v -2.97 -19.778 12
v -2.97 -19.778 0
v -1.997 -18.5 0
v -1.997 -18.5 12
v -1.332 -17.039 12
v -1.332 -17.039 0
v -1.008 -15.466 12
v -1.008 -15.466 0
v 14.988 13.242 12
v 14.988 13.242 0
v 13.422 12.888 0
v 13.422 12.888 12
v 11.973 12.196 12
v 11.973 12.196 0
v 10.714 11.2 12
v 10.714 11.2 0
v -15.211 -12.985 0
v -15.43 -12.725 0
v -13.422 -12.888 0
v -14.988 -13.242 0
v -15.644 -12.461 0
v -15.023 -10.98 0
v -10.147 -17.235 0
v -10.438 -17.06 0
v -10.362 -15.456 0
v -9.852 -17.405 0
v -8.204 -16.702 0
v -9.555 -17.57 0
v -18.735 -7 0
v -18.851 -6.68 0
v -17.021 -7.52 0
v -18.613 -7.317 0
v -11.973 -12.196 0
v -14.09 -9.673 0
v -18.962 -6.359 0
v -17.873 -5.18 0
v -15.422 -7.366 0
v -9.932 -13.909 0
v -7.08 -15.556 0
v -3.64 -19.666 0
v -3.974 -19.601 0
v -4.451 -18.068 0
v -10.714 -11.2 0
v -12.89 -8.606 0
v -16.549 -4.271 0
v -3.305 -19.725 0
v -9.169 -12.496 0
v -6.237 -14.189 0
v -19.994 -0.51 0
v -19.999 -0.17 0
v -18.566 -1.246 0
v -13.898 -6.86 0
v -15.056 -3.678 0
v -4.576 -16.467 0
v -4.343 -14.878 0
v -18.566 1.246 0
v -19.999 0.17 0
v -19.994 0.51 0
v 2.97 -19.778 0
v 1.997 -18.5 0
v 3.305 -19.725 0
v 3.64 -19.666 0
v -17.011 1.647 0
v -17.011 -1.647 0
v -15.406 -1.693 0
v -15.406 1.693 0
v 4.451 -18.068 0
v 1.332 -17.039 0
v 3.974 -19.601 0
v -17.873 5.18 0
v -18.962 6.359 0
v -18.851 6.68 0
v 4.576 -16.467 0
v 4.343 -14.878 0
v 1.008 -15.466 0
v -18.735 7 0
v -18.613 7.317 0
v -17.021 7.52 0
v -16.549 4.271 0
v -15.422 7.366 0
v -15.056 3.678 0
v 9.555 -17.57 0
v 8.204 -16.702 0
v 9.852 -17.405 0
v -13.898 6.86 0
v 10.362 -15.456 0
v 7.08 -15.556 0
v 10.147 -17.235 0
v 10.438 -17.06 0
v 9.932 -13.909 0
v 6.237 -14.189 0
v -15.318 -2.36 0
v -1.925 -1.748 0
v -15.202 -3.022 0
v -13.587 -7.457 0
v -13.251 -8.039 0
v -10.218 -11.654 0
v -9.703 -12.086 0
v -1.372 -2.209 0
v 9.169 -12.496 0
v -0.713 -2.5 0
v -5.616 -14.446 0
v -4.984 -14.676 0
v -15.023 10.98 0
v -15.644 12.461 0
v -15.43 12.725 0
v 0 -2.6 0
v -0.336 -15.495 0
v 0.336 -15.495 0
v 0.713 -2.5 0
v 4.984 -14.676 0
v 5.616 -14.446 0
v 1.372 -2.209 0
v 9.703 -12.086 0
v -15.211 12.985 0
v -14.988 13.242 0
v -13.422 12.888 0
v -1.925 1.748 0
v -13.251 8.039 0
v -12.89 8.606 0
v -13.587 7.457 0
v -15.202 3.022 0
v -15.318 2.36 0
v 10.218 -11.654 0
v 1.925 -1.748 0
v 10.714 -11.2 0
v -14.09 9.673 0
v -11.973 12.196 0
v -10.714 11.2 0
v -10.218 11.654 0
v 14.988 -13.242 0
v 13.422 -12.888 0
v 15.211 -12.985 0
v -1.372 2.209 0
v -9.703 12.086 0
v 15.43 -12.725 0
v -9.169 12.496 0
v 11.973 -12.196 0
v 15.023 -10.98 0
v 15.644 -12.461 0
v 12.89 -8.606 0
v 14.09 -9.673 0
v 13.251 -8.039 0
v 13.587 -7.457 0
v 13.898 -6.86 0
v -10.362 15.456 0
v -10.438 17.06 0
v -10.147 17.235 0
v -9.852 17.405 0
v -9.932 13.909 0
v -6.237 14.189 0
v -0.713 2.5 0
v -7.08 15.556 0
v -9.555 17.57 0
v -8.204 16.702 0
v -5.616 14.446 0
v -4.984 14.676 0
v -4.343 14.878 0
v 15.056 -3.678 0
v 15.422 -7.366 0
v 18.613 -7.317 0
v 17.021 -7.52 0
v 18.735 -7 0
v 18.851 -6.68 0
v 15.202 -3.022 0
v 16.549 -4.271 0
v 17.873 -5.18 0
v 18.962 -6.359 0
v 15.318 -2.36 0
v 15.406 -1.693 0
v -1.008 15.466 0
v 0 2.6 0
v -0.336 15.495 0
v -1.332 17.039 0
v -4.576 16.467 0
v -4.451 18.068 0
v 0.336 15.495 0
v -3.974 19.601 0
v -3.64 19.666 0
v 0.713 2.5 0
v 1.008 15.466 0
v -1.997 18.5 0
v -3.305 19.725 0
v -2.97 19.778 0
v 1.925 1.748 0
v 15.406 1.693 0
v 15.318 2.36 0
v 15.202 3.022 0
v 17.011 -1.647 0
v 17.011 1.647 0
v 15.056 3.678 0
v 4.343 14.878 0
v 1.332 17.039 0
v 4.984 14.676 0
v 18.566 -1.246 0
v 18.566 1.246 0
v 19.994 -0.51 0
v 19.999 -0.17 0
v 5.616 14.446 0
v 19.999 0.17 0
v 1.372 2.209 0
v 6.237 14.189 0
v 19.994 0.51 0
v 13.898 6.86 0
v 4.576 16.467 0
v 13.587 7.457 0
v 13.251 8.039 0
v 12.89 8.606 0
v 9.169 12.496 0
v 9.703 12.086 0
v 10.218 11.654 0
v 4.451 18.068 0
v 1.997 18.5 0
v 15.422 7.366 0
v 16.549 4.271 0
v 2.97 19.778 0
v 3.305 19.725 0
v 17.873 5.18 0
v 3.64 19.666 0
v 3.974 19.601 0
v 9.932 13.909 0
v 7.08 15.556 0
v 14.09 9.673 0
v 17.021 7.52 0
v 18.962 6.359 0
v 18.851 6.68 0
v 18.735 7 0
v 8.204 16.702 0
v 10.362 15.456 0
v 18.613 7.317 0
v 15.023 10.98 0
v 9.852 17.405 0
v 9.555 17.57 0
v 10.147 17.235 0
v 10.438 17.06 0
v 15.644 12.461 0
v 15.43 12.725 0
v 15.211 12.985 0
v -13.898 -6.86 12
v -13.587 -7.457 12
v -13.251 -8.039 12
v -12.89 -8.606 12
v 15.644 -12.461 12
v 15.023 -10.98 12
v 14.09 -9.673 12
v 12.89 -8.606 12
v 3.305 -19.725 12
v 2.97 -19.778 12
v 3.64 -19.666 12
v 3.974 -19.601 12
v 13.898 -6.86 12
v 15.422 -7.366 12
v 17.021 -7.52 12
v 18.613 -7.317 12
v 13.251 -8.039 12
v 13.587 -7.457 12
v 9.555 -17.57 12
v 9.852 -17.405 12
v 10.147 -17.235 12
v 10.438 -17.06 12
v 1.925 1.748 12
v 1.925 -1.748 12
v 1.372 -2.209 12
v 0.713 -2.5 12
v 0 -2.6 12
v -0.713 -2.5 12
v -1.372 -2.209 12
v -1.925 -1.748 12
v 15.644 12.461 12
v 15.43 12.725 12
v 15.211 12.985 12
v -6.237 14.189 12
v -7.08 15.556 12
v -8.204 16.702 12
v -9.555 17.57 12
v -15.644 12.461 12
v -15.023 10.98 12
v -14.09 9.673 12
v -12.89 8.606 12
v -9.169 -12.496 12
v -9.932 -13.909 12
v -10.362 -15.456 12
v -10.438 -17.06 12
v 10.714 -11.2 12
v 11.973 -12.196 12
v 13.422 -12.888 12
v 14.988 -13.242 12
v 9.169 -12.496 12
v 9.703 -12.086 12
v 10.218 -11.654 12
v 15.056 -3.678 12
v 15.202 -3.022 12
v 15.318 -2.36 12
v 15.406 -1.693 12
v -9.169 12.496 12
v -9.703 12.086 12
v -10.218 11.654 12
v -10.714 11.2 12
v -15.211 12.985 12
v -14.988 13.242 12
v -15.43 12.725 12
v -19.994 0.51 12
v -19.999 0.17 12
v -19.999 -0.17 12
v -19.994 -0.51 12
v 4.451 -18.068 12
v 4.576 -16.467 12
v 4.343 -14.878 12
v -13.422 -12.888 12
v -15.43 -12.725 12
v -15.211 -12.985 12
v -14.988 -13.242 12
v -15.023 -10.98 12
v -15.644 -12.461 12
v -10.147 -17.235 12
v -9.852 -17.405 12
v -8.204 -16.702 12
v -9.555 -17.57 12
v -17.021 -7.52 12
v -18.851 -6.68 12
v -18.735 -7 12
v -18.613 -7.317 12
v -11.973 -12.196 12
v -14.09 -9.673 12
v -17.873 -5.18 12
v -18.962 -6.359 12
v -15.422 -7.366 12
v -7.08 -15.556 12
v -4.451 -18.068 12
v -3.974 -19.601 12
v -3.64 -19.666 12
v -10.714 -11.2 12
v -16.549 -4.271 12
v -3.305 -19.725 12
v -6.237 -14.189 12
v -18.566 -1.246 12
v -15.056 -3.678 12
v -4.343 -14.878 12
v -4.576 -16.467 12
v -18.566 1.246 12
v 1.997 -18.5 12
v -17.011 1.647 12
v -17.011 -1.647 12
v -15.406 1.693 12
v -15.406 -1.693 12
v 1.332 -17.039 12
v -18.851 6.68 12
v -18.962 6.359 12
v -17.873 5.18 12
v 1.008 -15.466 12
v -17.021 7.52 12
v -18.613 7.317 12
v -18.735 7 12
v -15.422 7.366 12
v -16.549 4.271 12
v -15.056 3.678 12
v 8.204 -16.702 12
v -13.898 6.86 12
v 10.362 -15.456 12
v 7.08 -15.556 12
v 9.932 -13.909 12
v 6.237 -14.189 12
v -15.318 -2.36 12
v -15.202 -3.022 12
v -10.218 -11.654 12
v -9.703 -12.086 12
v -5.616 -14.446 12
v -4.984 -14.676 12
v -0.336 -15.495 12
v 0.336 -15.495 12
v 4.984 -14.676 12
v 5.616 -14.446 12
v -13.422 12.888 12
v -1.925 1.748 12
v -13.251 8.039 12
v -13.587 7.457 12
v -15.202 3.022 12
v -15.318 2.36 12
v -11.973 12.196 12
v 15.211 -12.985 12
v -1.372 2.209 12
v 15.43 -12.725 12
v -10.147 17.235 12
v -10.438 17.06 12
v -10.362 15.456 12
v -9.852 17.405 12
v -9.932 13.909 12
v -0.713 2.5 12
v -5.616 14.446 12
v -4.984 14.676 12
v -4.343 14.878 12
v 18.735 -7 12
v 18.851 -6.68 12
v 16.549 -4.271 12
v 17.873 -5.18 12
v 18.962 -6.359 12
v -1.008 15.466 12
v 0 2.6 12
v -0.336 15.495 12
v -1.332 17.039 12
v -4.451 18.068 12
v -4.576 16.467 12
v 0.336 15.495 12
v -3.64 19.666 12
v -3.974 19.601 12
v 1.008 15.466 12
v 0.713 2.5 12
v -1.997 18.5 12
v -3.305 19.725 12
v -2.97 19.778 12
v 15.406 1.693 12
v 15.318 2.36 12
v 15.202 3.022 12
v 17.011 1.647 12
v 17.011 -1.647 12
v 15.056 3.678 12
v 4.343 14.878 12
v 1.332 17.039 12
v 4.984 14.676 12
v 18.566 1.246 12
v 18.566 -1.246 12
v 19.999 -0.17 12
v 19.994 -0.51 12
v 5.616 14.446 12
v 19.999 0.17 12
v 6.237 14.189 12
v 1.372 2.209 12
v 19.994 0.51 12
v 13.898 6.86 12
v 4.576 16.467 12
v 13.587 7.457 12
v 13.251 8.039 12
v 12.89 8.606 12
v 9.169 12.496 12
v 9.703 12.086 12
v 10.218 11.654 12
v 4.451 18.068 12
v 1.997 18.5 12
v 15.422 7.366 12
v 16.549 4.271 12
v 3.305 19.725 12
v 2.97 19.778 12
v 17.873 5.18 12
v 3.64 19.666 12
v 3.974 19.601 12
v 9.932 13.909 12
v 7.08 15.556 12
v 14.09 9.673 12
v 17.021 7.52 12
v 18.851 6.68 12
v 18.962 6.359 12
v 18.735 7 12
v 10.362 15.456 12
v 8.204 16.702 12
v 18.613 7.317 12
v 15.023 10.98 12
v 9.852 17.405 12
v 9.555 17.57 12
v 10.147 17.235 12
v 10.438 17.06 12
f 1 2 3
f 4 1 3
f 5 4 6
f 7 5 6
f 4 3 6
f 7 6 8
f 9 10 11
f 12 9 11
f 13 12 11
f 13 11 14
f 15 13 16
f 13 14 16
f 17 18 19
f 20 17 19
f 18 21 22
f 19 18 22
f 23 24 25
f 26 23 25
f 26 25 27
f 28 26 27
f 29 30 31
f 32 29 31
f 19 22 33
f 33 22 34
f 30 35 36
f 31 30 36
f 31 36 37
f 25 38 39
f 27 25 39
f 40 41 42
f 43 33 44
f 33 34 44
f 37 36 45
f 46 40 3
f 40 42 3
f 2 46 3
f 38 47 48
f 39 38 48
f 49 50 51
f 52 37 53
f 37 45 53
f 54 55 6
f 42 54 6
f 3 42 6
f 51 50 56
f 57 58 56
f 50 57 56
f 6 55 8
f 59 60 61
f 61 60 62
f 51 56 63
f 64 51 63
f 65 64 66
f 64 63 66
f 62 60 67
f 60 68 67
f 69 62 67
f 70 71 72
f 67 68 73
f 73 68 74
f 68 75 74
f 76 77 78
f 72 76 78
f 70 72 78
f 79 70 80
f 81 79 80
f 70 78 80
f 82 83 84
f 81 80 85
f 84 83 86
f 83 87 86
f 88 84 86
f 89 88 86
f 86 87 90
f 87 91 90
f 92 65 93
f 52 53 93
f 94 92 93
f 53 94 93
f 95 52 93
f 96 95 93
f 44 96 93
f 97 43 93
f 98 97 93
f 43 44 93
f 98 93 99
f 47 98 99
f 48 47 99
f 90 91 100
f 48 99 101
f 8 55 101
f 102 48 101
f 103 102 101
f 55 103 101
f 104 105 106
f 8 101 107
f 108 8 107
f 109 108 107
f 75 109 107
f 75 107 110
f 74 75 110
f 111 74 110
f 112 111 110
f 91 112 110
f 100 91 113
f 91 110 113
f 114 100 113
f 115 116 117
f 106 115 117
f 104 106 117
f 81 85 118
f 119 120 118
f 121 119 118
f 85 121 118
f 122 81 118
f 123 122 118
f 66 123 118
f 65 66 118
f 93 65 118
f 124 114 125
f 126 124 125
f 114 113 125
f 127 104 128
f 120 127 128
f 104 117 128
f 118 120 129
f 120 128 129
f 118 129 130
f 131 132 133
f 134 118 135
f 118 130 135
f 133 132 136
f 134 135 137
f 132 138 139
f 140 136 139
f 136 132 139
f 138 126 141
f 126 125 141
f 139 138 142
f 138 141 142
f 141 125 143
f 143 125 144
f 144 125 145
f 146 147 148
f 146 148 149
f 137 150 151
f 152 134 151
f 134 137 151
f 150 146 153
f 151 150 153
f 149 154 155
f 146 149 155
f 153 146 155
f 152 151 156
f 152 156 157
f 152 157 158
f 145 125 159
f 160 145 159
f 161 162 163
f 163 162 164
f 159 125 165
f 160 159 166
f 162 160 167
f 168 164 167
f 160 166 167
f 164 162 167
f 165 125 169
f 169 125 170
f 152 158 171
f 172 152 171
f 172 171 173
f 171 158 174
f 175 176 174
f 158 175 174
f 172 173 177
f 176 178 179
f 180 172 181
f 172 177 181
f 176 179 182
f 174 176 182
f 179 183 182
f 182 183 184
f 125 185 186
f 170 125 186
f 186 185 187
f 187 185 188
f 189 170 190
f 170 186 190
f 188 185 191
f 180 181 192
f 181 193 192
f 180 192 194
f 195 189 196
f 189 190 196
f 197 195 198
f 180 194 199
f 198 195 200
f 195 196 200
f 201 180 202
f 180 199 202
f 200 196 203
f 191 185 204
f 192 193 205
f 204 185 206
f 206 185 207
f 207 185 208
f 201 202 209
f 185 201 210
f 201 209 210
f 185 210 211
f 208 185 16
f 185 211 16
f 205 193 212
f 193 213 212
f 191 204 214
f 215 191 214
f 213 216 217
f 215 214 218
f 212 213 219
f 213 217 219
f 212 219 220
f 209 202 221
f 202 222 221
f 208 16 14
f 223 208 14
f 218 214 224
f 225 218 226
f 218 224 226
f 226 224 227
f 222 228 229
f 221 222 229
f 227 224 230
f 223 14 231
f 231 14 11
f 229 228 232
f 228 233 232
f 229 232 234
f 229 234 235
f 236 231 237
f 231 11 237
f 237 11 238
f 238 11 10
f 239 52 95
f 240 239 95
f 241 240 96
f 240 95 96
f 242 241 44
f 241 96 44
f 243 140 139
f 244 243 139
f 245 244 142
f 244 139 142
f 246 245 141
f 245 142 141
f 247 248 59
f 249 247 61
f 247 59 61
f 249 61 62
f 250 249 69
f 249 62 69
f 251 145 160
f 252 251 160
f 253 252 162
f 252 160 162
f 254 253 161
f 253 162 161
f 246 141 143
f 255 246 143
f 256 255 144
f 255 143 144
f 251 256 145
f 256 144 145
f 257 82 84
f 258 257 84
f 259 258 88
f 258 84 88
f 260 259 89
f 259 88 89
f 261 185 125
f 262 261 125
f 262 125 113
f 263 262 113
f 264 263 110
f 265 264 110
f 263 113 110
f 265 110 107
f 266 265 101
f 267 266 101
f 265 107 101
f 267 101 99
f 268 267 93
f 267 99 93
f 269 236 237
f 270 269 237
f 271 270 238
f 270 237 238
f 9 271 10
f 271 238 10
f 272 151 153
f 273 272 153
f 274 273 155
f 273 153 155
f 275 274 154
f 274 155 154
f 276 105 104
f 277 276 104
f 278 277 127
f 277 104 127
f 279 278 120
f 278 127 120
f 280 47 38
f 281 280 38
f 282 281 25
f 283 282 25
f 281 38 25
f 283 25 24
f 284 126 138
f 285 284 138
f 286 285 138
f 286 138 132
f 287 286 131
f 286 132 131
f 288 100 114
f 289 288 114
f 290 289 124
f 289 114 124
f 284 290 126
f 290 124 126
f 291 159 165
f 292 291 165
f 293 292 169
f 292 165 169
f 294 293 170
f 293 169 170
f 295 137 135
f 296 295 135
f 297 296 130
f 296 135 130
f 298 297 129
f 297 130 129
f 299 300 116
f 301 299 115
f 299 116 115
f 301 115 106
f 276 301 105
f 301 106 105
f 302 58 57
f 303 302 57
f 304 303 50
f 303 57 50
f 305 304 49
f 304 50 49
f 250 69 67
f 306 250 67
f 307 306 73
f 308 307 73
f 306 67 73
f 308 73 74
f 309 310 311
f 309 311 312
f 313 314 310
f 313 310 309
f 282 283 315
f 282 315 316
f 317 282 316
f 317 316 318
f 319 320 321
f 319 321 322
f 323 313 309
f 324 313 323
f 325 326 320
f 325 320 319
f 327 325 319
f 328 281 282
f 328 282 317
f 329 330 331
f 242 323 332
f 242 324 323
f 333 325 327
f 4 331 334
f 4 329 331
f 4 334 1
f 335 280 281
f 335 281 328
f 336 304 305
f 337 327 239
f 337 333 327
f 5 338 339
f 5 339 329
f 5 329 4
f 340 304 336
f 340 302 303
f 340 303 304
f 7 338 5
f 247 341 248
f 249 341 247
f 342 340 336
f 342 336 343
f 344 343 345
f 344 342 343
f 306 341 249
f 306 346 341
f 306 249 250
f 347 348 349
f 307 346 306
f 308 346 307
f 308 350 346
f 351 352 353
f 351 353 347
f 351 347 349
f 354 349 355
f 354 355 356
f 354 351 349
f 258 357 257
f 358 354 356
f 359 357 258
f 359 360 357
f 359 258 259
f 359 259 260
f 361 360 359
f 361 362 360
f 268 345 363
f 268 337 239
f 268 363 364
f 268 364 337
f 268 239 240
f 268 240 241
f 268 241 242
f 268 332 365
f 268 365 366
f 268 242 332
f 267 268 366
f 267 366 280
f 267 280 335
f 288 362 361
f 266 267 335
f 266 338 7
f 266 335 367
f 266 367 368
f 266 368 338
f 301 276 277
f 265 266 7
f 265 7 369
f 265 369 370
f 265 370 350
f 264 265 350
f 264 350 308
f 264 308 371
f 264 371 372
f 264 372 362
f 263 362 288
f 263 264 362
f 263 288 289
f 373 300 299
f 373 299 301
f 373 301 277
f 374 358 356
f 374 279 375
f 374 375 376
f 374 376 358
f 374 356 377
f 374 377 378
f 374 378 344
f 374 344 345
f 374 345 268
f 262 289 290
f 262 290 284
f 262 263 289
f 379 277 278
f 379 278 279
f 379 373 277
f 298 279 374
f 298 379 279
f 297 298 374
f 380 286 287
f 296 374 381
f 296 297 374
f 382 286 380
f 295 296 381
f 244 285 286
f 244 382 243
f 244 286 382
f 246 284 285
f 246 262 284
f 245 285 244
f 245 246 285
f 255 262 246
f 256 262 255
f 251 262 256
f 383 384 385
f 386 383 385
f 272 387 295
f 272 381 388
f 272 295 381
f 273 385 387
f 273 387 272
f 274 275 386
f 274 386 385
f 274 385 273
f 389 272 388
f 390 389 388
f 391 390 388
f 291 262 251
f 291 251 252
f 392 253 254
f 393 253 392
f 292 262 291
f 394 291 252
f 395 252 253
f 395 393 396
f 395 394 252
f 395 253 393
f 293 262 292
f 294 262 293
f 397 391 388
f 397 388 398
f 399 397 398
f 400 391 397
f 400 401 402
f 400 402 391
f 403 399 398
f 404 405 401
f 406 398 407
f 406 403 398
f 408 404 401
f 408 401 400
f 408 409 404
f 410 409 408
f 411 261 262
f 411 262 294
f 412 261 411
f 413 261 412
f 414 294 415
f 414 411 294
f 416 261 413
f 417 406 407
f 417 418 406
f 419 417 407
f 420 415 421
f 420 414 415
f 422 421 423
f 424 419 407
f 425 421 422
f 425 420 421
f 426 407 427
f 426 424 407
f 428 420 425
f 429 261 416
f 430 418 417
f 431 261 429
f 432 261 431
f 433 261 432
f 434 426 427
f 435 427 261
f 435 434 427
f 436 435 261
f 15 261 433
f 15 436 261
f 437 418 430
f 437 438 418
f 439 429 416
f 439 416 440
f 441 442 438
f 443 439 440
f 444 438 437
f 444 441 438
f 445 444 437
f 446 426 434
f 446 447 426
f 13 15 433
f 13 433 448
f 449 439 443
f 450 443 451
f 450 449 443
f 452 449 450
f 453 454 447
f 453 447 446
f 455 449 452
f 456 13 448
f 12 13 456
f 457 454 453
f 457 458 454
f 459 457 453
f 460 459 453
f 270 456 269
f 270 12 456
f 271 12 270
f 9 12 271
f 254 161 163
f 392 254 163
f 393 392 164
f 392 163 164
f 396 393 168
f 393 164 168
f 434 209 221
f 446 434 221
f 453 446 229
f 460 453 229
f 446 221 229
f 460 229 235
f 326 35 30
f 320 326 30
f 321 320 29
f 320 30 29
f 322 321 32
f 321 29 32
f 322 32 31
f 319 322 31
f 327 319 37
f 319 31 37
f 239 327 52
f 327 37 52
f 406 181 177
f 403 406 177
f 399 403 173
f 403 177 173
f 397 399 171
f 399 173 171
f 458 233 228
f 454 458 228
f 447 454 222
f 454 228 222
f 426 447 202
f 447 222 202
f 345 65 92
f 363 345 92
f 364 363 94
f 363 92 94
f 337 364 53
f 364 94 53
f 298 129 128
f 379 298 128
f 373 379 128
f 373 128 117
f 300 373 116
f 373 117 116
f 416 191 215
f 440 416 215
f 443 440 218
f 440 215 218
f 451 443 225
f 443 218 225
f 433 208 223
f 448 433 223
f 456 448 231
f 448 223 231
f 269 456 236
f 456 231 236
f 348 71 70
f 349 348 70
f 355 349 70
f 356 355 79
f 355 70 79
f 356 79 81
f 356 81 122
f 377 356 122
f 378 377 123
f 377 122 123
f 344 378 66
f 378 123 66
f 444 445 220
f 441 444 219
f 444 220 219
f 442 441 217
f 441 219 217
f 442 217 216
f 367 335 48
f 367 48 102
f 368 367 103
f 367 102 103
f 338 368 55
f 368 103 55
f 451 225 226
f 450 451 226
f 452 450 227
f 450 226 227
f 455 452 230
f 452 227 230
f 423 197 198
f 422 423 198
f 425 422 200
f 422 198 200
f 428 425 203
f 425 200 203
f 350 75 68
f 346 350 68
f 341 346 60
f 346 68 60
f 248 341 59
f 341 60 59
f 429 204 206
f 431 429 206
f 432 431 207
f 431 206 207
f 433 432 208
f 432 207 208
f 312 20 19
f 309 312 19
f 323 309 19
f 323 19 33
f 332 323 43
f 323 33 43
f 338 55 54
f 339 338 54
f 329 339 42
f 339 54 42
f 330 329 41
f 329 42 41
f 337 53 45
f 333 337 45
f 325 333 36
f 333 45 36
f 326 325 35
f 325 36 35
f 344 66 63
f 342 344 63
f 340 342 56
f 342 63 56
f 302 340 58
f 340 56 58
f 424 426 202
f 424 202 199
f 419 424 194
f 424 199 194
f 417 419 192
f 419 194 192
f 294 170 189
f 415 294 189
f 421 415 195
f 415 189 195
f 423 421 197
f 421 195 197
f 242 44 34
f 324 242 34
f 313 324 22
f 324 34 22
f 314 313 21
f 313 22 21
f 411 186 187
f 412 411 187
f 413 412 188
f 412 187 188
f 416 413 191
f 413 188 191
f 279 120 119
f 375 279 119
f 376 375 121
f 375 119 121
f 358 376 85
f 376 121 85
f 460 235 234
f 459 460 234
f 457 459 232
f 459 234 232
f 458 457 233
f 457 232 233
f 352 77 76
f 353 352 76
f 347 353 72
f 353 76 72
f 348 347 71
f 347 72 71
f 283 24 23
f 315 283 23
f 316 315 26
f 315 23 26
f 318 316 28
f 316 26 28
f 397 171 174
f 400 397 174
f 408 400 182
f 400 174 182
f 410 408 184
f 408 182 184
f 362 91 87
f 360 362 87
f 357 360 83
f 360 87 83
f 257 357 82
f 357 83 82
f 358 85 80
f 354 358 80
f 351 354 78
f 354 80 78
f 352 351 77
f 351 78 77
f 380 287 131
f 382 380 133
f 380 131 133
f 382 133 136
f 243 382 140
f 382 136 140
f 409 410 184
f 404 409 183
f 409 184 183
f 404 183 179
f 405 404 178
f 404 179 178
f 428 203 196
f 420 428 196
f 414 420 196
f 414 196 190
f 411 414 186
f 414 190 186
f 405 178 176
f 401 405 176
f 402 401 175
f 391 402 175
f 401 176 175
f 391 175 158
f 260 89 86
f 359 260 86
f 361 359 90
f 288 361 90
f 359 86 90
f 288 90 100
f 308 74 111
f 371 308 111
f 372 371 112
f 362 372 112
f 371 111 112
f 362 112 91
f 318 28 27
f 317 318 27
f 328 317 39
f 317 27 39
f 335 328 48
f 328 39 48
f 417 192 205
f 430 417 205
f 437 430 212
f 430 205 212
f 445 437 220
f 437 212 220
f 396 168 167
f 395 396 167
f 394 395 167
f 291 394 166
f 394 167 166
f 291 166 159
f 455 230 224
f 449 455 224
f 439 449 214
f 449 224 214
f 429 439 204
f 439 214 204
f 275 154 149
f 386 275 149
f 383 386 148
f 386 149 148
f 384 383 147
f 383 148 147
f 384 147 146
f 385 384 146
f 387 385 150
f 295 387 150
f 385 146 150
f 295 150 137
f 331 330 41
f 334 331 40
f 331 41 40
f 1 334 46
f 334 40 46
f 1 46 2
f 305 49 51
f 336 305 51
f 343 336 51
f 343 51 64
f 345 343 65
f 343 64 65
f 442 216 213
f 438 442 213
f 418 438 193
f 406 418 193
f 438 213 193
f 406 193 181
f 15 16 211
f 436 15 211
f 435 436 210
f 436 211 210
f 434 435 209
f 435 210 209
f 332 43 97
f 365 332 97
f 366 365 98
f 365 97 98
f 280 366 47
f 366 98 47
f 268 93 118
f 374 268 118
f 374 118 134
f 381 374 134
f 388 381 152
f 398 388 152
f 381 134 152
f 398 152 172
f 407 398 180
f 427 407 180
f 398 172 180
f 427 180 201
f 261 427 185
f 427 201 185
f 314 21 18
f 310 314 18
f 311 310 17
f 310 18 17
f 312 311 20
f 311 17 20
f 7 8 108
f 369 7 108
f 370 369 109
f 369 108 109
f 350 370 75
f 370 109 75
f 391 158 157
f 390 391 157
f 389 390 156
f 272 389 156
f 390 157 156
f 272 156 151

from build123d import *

# Parameters (mm, degrees)
SALIENTE_EXTRUIR1_DEPTH    = 12
CORTAR_EXTRUIR1_DEPTH      = 31.580715245
CORTAR_EXTRUIR1_DEPTH_BACK = 31.580715245


with BuildPart() as part:
    # Croquis2 → Saliente-Extruir1 (new body)
    with BuildSketch(Plane.XY):
        with BuildLine():
            ThreePointArc((-15.643576177, 12.461080386), (-14.593058293, 10.300539912), (-12.890222435, 8.605879768))
            ThreePointArc((-12.890222435, 8.605879768), (-13.422527733, 7.7495), (-13.898021719, 6.860320205))
            ThreePointArc((-13.898021719, 6.860320205), (-16.217058383, 7.487689244), (-18.613400261, 7.317194183))
            ThreePointArc((-18.613400261, 7.317194183), (-18.793852416, 6.840402867), (-18.962093596, 6.359167119))
            ThreePointArc((-18.962093596, 6.359167119), (-17.23598133, 4.688221457), (-15.056231134, 3.678165989))
            ThreePointArc((-15.056231134, 3.678165989), (-15.263535364, 2.691373106), (-15.406236152, 1.693188893))
            ThreePointArc((-15.406236152, 1.693188893), (-17.799990642, 1.489565697), (-19.993502677, 0.509755553))
            ThreePointArc((-19.993502677, 0.509755553), (-20, 0), (-19.993502677, -0.509755553))
            ThreePointArc((-19.993502677, -0.509755553), (-17.799990642, -1.489565697), (-15.406236152, -1.693188893))
            ThreePointArc((-15.406236152, -1.693188893), (-15.263535364, -2.691373106), (-15.056231134, -3.678165989))
            ThreePointArc((-15.056231134, -3.678165989), (-17.23598133, -4.688221457), (-18.962093596, -6.359167119))
            ThreePointArc((-18.962093596, -6.359167119), (-18.793852416, -6.840402867), (-18.613400261, -7.317194183))
            ThreePointArc((-18.613400261, -7.317194183), (-16.217058383, -7.487689244), (-13.898021719, -6.860320205))
            ThreePointArc((-13.898021719, -6.860320205), (-13.422527733, -7.7495), (-12.890222435, -8.605879768))
            ThreePointArc((-12.890222435, -8.605879768), (-14.593058293, -10.300539912), (-15.643576177, -12.461080386))
            ThreePointArc((-15.643576177, -12.461080386), (-15.320888862, -12.855752194), (-14.98824707, -13.242071204))
            ThreePointArc((-14.98824707, -13.242071204), (-12.678109545, -12.582686962), (-10.713500753, -11.199995653))
            ThreePointArc((-10.713500753, -11.199995653), (-9.962565163, -11.872922824), (-9.16946267, -12.495597438))
            ThreePointArc((-9.16946267, -12.495597438), (-10.189997055, -14.670461235), (-10.438212597, -17.060003452))
            ThreePointArc((-10.438212597, -17.060003452), (-10, -17.320508076), (-9.555290079, -17.569759005))
            ThreePointArc((-9.555290079, -17.569759005), (-7.609993587, -16.160026932), (-6.236773482, -14.188786331))
            ThreePointArc((-6.236773482, -14.188786331), (-5.300970201, -14.56429593), (-4.342730381, -14.878161642))
            ThreePointArc((-4.342730381, -14.878161642), (-4.557871785, -17.270908419), (-3.973846526, -19.601238323))
            ThreePointArc((-3.973846526, -19.601238323), (-3.472963553, -19.69615506), (-2.969824084, -19.778274569))
            ThreePointArc((-2.969824084, -19.778274569), (-1.62400009, -17.788229157), (-1.007799284, -15.466199973))
            ThreePointArc((-1.007799284, -15.466199973), (0, -15.499), (1.007799284, -15.466199973))
            ThreePointArc((1.007799284, -15.466199973), (1.62400009, -17.788229157), (2.969824084, -19.778274569))
            ThreePointArc((2.969824084, -19.778274569), (3.472963553, -19.69615506), (3.973846526, -19.601238323))
            ThreePointArc((3.973846526, -19.601238323), (4.557871785, -17.270908419), (4.342730381, -14.878161642))
            ThreePointArc((4.342730381, -14.878161642), (5.300970201, -14.56429593), (6.236773482, -14.188786331))
            ThreePointArc((6.236773482, -14.188786331), (7.609993587, -16.160026932), (9.555290079, -17.569759005))
            ThreePointArc((9.555290079, -17.569759005), (10, -17.320508076), (10.438212597, -17.060003452))
            ThreePointArc((10.438212597, -17.060003452), (10.189997055, -14.670461235), (9.16946267, -12.495597438))
            ThreePointArc((9.16946267, -12.495597438), (9.962565163, -11.872922824), (10.713500753, -11.199995653))
            ThreePointArc((10.713500753, -11.199995653), (12.678109545, -12.582686962), (14.98824707, -13.242071204))
            ThreePointArc((14.98824707, -13.242071204), (15.320888862, -12.855752194), (15.643576177, -12.461080386))
            ThreePointArc((15.643576177, -12.461080386), (14.593058293, -10.300539912), (12.890222435, -8.605879768))
            ThreePointArc((12.890222435, -8.605879768), (13.422527733, -7.7495), (13.898021719, -6.860320205))
            ThreePointArc((13.898021719, -6.860320205), (16.217058383, -7.487689244), (18.613400261, -7.317194183))
            ThreePointArc((18.613400261, -7.317194183), (18.793852416, -6.840402867), (18.962093596, -6.359167119))
            ThreePointArc((18.962093596, -6.359167119), (17.23598133, -4.688221457), (15.056231134, -3.678165989))
            ThreePointArc((15.056231134, -3.678165989), (15.263535364, -2.691373106), (15.406236152, -1.693188893))
            ThreePointArc((15.406236152, -1.693188893), (17.799990642, -1.489565697), (19.993502677, -0.509755553))
            ThreePointArc((19.993502677, -0.509755553), (20, 0), (19.993502677, 0.509755553))
            ThreePointArc((19.993502677, 0.509755553), (17.799990642, 1.489565697), (15.406236152, 1.693188893))
            ThreePointArc((15.406236152, 1.693188893), (15.263535364, 2.691373106), (15.056231134, 3.678165989))
            ThreePointArc((15.056231134, 3.678165989), (17.23598133, 4.688221457), (18.962093596, 6.359167119))
            ThreePointArc((18.962093596, 6.359167119), (18.793852416, 6.840402867), (18.613400261, 7.317194183))
            ThreePointArc((18.613400261, 7.317194183), (16.217058383, 7.487689244), (13.898021719, 6.860320205))
            ThreePointArc((13.898021719, 6.860320205), (13.422527733, 7.7495), (12.890222435, 8.605879768))
            ThreePointArc((12.890222435, 8.605879768), (14.593058293, 10.300539912), (15.643576177, 12.461080386))
            ThreePointArc((15.643576177, 12.461080386), (15.320888862, 12.855752194), (14.98824707, 13.242071204))
            ThreePointArc((14.98824707, 13.242071204), (12.678109545, 12.582686962), (10.713500753, 11.199995653))
            ThreePointArc((10.713500753, 11.199995653), (9.962565163, 11.872922824), (9.16946267, 12.495597438))
            ThreePointArc((9.16946267, 12.495597438), (10.189997055, 14.670461235), (10.438212597, 17.060003452))
            ThreePointArc((10.438212597, 17.060003452), (10, 17.320508076), (9.555290079, 17.569759005))
            ThreePointArc((9.555290079, 17.569759005), (7.609993587, 16.160026932), (6.236773482, 14.188786331))
            ThreePointArc((6.236773482, 14.188786331), (5.300970201, 14.56429593), (4.342730381, 14.878161642))
            ThreePointArc((4.342730381, 14.878161642), (4.557871785, 17.270908419), (3.973846526, 19.601238323))
            ThreePointArc((3.973846526, 19.601238323), (3.472963553, 19.69615506), (2.969824084, 19.778274569))
            ThreePointArc((2.969824084, 19.778274569), (1.62400009, 17.788229157), (1.007799284, 15.466199973))
            ThreePointArc((1.007799284, 15.466199973), (0, 15.499), (-1.007799284, 15.466199973))
            ThreePointArc((-1.007799284, 15.466199973), (-1.62400009, 17.788229157), (-2.969824084, 19.778274569))
            ThreePointArc((-2.969824084, 19.778274569), (-3.472963553, 19.69615506), (-3.973846526, 19.601238323))
            ThreePointArc((-3.973846526, 19.601238323), (-4.557871785, 17.270908419), (-4.342730381, 14.878161642))
            ThreePointArc((-4.342730381, 14.878161642), (-5.300970201, 14.56429593), (-6.236773482, 14.188786331))
            ThreePointArc((-6.236773482, 14.188786331), (-7.609993587, 16.160026932), (-9.555290079, 17.569759005))
            ThreePointArc((-9.555290079, 17.569759005), (-10, 17.320508076), (-10.438212597, 17.060003452))
            ThreePointArc((-10.438212597, 17.060003452), (-10.189997055, 14.670461235), (-9.16946267, 12.495597438))
            ThreePointArc((-9.16946267, 12.495597438), (-9.962565163, 11.872922824), (-10.713500753, 11.199995653))
            ThreePointArc((-10.713500753, 11.199995653), (-12.678109545, 12.582686962), (-14.98824707, 13.242071204))
            ThreePointArc((-14.98824707, 13.242071204), (-15.320888862, 12.855752194), (-15.643576177, 12.461080386))
        make_face()
    extrude(amount=SALIENTE_EXTRUIR1_DEPTH)

    # Croquis3 → Cortar-Extruir1 (cut, two sides: drawn at the far end of the back side and taken through both)
    with BuildSketch(Plane.XY.offset(12).offset(-CORTAR_EXTRUIR1_DEPTH_BACK)):
        with BuildLine():
            Line((-1.925, -1.74767703), (-1.925, 1.74767703))
            ThreePointArc((-1.925, 1.74767703), (0, 2.6), (1.925, 1.74767703))
            Line((1.925, 1.74767703), (1.925, -1.74767703))
            ThreePointArc((1.925, -1.74767703), (0, -2.6), (-1.925, -1.74767703))
        make_face()
    extrude(amount=CORTAR_EXTRUIR1_DEPTH + CORTAR_EXTRUIR1_DEPTH_BACK, mode=Mode.SUBTRACT)


solid = part.part
